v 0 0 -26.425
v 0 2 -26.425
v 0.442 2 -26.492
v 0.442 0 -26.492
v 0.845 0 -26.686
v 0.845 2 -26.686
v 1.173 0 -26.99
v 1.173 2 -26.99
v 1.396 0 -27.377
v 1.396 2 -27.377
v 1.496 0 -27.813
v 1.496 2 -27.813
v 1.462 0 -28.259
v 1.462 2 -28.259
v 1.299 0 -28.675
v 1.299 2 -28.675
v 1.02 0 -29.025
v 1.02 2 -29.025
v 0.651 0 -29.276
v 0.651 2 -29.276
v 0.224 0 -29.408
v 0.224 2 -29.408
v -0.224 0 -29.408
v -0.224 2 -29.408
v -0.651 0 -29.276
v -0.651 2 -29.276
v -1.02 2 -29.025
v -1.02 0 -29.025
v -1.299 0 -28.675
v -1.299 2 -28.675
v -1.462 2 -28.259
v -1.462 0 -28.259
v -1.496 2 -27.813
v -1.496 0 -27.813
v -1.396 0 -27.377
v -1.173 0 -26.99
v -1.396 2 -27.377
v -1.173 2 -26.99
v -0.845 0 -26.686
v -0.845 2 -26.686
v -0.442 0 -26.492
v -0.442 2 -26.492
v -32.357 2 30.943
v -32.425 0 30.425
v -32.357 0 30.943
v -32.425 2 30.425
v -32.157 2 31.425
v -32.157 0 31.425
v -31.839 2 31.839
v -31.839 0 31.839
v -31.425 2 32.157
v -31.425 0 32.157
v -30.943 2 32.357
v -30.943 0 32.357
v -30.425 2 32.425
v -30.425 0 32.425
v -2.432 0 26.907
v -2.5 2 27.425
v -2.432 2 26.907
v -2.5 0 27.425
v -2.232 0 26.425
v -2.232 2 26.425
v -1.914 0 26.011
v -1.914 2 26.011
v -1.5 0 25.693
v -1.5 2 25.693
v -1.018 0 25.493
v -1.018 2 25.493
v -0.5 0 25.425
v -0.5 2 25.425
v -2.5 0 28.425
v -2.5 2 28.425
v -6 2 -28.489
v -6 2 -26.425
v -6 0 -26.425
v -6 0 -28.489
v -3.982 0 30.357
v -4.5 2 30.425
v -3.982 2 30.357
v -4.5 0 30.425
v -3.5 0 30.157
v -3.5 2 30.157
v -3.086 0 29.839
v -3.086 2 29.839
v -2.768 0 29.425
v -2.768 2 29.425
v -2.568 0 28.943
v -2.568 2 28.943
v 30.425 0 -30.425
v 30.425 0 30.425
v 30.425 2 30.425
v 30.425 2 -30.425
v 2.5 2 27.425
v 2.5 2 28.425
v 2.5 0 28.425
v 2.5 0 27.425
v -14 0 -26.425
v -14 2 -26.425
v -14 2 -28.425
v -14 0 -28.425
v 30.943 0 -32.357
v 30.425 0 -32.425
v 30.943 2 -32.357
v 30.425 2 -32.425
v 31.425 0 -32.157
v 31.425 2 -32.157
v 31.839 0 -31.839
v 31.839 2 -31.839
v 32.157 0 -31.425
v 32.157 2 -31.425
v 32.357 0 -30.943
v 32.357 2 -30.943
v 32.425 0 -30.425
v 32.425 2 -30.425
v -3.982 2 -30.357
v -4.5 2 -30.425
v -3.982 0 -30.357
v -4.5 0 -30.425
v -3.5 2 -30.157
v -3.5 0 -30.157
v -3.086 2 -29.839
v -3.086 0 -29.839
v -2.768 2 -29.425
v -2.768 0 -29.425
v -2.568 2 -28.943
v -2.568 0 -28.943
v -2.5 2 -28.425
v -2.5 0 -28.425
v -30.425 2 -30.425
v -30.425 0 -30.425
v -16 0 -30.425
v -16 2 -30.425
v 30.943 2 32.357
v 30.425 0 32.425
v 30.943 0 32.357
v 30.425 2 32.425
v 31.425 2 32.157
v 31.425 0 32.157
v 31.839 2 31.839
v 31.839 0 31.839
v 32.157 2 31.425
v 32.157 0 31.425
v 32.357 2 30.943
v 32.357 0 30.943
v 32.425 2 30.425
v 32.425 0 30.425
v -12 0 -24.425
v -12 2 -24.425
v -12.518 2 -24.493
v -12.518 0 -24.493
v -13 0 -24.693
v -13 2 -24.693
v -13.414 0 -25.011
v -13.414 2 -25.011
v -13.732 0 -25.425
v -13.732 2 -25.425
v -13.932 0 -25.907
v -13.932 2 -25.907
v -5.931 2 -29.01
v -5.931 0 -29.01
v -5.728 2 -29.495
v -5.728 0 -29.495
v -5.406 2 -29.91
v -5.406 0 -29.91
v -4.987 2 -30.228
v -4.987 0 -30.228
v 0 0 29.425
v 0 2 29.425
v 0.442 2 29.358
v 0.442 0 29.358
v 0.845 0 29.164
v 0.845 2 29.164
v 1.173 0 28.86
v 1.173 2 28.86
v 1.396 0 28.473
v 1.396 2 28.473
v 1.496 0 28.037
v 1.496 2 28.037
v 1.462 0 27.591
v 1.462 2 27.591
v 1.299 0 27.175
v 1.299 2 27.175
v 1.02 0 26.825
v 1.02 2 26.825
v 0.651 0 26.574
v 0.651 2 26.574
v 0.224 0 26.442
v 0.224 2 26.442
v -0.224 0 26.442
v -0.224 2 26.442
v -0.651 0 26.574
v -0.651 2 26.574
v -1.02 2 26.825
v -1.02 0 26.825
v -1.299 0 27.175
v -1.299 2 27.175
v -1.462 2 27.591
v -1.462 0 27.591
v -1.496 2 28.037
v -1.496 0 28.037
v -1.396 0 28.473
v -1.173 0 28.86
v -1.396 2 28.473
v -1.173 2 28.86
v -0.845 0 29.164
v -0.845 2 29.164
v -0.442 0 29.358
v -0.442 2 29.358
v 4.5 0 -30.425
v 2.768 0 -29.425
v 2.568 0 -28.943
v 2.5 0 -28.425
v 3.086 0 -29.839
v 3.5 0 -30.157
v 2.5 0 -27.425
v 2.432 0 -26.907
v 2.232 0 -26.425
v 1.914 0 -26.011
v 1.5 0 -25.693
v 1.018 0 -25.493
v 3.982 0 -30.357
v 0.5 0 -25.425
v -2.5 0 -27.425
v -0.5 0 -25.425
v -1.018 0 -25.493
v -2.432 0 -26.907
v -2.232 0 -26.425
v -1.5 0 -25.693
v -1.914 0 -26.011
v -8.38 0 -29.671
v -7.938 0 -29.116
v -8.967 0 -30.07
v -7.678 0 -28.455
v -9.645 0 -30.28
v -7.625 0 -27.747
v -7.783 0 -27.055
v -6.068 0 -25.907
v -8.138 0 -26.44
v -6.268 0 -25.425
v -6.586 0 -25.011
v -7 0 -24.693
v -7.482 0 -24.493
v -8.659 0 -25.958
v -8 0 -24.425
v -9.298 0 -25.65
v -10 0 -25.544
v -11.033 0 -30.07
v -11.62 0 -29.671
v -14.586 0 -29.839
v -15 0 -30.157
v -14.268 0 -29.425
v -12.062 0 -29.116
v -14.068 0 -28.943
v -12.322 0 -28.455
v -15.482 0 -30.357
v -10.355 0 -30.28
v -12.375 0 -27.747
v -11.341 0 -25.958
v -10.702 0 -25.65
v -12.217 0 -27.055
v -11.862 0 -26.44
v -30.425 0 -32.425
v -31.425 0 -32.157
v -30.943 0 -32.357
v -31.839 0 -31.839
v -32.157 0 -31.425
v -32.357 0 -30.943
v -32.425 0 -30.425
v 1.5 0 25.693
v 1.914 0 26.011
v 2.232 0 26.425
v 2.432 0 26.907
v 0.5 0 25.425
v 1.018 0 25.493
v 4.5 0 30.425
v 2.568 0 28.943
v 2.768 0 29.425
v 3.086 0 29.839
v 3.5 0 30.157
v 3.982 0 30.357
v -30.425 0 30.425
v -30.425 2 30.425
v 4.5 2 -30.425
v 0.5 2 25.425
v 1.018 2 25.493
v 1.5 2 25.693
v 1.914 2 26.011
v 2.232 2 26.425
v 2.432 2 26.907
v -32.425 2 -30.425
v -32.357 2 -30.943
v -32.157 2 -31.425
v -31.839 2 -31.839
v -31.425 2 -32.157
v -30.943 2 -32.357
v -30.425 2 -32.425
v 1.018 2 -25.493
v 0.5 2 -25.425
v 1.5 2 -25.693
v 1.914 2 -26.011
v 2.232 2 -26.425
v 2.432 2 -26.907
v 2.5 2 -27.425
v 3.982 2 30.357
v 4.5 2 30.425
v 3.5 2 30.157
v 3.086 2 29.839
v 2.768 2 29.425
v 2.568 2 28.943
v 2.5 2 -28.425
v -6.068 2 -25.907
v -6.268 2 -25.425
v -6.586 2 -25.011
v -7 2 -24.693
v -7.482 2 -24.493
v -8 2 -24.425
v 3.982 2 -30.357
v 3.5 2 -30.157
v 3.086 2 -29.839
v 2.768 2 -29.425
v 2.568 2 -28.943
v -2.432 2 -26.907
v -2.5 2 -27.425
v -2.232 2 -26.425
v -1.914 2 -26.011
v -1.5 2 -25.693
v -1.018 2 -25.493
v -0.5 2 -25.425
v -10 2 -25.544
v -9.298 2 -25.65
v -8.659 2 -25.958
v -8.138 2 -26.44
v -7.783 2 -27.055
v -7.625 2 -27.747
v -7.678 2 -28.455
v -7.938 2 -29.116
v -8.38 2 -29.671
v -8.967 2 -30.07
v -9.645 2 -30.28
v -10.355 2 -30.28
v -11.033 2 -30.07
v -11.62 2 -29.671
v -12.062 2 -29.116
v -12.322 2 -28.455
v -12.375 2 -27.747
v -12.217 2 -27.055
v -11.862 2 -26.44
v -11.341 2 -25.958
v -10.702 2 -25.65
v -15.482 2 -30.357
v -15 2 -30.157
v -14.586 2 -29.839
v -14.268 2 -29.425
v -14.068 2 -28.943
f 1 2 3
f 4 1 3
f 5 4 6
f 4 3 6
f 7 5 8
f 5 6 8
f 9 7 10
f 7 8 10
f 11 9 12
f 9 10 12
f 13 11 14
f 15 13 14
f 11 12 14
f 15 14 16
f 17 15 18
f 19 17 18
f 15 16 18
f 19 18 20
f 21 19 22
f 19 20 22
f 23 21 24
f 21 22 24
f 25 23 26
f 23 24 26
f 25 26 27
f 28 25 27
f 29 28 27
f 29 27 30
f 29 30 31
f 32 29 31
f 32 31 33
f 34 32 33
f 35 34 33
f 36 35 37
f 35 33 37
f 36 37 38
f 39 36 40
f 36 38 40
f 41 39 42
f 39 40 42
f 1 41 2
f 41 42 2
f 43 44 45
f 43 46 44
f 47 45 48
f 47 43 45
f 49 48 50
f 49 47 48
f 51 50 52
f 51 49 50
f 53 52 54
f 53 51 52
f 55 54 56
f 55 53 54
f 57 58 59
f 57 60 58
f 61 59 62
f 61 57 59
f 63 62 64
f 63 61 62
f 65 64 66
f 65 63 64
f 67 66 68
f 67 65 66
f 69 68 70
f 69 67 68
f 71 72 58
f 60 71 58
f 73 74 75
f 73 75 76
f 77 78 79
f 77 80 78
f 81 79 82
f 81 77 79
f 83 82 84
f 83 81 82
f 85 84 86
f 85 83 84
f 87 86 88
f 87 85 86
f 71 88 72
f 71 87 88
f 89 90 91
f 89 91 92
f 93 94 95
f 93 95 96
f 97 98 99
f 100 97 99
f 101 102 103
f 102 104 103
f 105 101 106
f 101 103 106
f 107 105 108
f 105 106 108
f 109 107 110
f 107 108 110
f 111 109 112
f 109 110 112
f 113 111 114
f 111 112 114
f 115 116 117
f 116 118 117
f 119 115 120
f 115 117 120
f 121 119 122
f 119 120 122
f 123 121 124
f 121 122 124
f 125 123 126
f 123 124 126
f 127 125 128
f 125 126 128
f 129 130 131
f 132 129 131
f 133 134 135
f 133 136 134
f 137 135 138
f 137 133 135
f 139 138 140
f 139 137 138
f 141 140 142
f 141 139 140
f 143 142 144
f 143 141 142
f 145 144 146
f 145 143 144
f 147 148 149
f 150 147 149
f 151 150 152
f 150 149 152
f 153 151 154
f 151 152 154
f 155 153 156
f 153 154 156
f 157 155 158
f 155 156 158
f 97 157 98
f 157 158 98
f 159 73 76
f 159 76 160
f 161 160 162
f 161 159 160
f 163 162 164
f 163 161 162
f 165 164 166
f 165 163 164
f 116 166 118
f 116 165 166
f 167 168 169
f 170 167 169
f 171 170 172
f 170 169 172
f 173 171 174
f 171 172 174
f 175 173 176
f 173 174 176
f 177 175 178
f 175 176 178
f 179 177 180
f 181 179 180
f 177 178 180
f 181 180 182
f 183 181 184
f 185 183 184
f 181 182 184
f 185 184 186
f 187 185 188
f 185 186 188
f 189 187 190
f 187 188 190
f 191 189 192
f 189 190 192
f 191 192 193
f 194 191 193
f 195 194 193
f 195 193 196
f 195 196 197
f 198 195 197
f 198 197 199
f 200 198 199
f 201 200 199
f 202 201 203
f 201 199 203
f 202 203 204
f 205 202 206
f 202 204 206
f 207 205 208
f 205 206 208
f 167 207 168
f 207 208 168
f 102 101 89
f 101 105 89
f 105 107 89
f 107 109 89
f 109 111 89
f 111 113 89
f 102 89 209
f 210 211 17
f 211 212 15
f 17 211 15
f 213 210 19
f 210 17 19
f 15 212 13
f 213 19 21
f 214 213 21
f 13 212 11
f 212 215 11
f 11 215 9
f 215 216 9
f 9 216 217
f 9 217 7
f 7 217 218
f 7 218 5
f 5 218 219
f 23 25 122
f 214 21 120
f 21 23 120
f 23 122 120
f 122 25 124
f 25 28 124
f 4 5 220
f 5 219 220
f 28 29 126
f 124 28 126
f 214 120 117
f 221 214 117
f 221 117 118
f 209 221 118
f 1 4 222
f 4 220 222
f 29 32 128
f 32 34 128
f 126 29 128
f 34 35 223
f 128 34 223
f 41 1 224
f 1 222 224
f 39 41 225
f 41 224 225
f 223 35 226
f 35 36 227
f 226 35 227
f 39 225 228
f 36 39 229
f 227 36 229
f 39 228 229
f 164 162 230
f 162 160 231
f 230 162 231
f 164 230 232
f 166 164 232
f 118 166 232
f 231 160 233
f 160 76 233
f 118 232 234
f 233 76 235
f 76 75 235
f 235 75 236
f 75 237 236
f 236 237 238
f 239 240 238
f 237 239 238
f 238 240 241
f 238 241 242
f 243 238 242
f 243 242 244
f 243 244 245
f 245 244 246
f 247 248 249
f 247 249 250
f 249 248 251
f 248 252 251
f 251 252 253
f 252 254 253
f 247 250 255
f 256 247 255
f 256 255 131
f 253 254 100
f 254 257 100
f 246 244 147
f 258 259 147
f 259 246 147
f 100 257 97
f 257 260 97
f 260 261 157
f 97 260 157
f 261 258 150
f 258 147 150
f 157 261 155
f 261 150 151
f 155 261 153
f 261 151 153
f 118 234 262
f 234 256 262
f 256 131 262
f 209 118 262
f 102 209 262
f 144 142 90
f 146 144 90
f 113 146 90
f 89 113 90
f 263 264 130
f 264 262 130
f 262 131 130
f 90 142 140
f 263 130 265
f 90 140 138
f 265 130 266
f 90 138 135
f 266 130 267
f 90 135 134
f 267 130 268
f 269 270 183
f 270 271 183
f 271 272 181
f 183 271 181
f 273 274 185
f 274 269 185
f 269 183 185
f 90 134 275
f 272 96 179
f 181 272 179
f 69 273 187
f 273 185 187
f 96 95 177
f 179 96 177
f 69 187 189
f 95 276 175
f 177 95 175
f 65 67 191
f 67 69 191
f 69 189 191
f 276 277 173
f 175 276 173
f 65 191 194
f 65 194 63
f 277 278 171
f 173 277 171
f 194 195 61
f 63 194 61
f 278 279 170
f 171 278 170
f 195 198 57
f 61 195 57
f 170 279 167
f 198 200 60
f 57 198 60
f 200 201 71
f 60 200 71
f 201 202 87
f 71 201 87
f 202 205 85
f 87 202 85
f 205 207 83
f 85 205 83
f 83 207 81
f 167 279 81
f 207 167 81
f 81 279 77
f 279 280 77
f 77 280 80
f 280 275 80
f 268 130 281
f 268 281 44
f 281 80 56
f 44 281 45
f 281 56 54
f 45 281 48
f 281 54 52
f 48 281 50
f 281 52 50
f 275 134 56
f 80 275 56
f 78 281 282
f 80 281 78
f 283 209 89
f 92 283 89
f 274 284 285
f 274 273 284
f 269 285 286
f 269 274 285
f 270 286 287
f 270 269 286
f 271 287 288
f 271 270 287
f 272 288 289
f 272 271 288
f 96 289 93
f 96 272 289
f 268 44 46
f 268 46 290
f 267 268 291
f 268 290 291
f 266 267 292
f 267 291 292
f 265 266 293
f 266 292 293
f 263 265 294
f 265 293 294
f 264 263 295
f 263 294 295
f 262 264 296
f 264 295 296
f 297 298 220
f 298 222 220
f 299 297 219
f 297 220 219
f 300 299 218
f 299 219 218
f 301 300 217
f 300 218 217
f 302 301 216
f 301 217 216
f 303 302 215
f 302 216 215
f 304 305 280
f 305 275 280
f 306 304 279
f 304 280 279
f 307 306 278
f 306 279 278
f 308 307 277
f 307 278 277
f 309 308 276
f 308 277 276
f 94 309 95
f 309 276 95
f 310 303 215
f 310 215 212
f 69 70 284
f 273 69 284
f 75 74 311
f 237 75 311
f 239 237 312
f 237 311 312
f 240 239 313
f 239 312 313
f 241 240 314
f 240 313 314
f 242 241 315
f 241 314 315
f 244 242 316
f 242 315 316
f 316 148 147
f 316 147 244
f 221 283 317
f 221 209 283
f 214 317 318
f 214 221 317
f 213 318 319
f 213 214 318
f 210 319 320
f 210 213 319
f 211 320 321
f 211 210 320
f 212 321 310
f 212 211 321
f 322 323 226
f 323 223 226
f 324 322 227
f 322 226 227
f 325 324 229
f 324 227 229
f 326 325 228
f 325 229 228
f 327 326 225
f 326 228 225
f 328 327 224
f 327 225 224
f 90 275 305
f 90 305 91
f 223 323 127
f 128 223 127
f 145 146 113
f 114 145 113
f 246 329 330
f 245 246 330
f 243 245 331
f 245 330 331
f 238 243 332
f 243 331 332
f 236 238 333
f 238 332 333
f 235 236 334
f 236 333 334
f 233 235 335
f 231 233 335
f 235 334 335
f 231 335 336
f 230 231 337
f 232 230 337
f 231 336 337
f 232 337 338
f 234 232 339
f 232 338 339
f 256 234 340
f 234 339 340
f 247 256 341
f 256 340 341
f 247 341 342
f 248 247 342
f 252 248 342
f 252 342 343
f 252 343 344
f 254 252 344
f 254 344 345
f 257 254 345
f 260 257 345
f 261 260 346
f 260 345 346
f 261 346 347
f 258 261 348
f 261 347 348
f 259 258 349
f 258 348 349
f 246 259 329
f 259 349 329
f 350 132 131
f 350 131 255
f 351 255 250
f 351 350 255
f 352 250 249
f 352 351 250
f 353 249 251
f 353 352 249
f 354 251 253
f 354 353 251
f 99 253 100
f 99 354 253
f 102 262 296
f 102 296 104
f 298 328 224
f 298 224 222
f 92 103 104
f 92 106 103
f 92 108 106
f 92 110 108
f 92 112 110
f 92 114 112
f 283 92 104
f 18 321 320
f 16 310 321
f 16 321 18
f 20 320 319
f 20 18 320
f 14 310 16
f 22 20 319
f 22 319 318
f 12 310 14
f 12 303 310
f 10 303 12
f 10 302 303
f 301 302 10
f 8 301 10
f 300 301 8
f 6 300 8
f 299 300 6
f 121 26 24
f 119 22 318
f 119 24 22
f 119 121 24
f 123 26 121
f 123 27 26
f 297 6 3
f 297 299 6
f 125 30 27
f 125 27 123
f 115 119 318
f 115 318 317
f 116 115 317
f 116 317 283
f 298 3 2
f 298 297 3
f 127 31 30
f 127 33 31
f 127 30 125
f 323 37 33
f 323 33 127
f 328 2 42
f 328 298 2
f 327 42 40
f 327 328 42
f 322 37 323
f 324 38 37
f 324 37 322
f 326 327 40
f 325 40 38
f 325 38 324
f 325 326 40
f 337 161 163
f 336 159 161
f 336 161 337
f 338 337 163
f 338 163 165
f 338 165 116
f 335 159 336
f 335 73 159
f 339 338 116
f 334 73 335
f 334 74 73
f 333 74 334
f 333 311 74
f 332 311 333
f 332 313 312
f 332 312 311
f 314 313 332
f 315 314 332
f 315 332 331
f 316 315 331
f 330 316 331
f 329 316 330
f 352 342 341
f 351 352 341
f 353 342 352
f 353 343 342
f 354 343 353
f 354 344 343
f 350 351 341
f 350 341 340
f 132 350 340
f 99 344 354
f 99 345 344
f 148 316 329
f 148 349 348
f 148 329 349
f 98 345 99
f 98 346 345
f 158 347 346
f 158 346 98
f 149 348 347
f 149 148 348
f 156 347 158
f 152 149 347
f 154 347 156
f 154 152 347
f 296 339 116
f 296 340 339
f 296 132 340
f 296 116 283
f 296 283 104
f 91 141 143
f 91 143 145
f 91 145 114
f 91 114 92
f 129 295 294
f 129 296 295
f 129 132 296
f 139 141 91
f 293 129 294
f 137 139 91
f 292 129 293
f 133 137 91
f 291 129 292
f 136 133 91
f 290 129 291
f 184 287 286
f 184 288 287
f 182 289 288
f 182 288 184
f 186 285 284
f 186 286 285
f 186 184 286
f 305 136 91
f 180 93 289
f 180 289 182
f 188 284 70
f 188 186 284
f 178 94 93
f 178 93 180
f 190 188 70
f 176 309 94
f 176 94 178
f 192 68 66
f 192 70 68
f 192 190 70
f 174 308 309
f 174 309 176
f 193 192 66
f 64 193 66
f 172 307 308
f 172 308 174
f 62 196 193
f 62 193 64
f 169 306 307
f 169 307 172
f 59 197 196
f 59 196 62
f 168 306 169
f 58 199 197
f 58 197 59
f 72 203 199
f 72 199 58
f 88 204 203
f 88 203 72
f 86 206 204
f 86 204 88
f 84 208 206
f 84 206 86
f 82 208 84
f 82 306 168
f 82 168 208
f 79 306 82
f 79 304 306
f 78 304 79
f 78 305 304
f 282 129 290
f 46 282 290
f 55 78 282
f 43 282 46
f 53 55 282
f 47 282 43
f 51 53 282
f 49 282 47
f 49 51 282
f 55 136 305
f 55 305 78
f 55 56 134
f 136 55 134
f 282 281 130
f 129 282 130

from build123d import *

# Parameters (mm, degrees)
SKETCH1_W           = 64.85
SKETCH1_H           = 64.85
SKETCH1_W_2         = 60.85
SKETCH1_H_2         = 60.85
BOSS_EXTRUDE1_DEPTH = 2
SKETCH2_W           = 5
SKETCH2_H           = 5
SKETCH2_R           = 1.5
BOSS_EXTRUDE2_DEPTH = 2
FILLET1_R           = 2
SKETCH3_W           = 8
SKETCH3_H           = 6
SKETCH3_R           = 2.38125
BOSS_EXTRUDE3_DEPTH = 2
FILLET2_R           = 2


with BuildPart() as part:
    # Sketch1 → Boss-Extrude1 (new body)
    with BuildSketch(Plane(origin=(0, 0, 0), x_dir=(1, 0, 0), z_dir=(0, 1, 0))):
        Rectangle(SKETCH1_W, SKETCH1_H)
        Rectangle(SKETCH1_W_2, SKETCH1_H_2, mode=Mode.SUBTRACT)
    extrude(amount=BOSS_EXTRUDE1_DEPTH)

    # Sketch2 → Boss-Extrude2 (add)
    # profile 1 of 2: a face of its own
    with BuildSketch(Plane(origin=(0, 2, 0), x_dir=(1, 0, 0), z_dir=(0, 1, 0))):
        with Locations((0, 27.925)):
            Rectangle(SKETCH2_W, SKETCH2_H)
        with Locations(Location((0, 27.925, 0), (0, 0, 270))):
            Circle(SKETCH2_R, mode=Mode.SUBTRACT)
    # profile 2 of 2: a face of its own
    with BuildSketch(Plane(origin=(0, 2, 0), x_dir=(1, 0, 0), z_dir=(0, 1, 0))):
        with Locations((0, -27.925)):
            Rectangle(SKETCH2_W, SKETCH2_H)
        with Locations(Location((0, -27.925, 0), (0, 0, 270))):
            Circle(SKETCH2_R, mode=Mode.SUBTRACT)
    extrude(amount=-BOSS_EXTRUDE2_DEPTH)

    # Fillet1
    fillet1_edges = [part.edges().sort_by_distance(p)[0] for p in [
        (32.425, 1, 32.425),
        (-32.425, 1, 32.425),
        (32.425, 1, -32.425),
        (-32.425, 1, -32.425),
        (2.5, 1, -30.425),
        (-2.5, 1, -30.425),
        (-2.5, 1, 30.425),
        (2.5, 1, 30.425),
        (2.5, 1, -25.425),
        (-2.5, 1, -25.425),
        (-2.5, 1, 25.425),
        (2.5, 1, 25.425),
    ]]
    fillet(fillet1_edges, radius=FILLET1_R)

    # Sketch3 → Boss-Extrude3 (add)
    with BuildSketch(Plane(origin=(0, 2, 0), x_dir=(1, 0, 0), z_dir=(0, 1, 0))):
        with Locations((-10, 27.425)):
            Rectangle(SKETCH3_W, SKETCH3_H)
        with Locations(Location((-10, 27.925, 0), (0, 0, 270))):
            Circle(SKETCH3_R, mode=Mode.SUBTRACT)
    extrude(amount=-BOSS_EXTRUDE3_DEPTH)

    # Fillet2
    # the kernel refuses this fillet: 2 mm, written as the material it adds along each edge
    with BuildSketch(Plane(origin=(-14, 2, -30.425), x_dir=(-1, 0, 0), z_dir=(0, -1, 0))) as fillet2_piece_1:
        with BuildLine():
            CenterArc((FILLET2_R, -FILLET2_R), FILLET2_R, 90, 90)
            Line((0, -FILLET2_R), (0, 0))
            Line((0, 0), (FILLET2_R, 0))
        make_face()
    extrude(amount=2)
    with BuildSketch(Plane(origin=(-6, 2, -30.425), x_dir=(1, 0, 0), z_dir=(0, -1, 0))) as fillet2_piece_2:
        with BuildLine():
            CenterArc((2, 1.936491673), FILLET2_R, 180, 75.522487814)
            Line((0, 1.936491673), (0, 0))
            Line((0, 0), (1.5, 0))
        make_face()
    extrude(amount=2)
    # the kernel refuses this fillet: 2 mm, written as the material it takes off along each edge
    with BuildSketch(Plane(origin=(-14, 7, -24.425), x_dir=(1, 0, 0), z_dir=(0, -1, 0)), Plane(origin=(-6, 7, -24.425), x_dir=(0, 0, -1), z_dir=(0, -1, 0))) as fillet2_2_piece_1:
        with BuildLine():
            CenterArc((FILLET2_R, -FILLET2_R), FILLET2_R, 90, 90)
            Line((0, -FILLET2_R), (0, 0))
            Line((0, 0), (FILLET2_R, 0))
        make_face()
    extrude(amount=12, mode=Mode.SUBTRACT)


solid = part.part
